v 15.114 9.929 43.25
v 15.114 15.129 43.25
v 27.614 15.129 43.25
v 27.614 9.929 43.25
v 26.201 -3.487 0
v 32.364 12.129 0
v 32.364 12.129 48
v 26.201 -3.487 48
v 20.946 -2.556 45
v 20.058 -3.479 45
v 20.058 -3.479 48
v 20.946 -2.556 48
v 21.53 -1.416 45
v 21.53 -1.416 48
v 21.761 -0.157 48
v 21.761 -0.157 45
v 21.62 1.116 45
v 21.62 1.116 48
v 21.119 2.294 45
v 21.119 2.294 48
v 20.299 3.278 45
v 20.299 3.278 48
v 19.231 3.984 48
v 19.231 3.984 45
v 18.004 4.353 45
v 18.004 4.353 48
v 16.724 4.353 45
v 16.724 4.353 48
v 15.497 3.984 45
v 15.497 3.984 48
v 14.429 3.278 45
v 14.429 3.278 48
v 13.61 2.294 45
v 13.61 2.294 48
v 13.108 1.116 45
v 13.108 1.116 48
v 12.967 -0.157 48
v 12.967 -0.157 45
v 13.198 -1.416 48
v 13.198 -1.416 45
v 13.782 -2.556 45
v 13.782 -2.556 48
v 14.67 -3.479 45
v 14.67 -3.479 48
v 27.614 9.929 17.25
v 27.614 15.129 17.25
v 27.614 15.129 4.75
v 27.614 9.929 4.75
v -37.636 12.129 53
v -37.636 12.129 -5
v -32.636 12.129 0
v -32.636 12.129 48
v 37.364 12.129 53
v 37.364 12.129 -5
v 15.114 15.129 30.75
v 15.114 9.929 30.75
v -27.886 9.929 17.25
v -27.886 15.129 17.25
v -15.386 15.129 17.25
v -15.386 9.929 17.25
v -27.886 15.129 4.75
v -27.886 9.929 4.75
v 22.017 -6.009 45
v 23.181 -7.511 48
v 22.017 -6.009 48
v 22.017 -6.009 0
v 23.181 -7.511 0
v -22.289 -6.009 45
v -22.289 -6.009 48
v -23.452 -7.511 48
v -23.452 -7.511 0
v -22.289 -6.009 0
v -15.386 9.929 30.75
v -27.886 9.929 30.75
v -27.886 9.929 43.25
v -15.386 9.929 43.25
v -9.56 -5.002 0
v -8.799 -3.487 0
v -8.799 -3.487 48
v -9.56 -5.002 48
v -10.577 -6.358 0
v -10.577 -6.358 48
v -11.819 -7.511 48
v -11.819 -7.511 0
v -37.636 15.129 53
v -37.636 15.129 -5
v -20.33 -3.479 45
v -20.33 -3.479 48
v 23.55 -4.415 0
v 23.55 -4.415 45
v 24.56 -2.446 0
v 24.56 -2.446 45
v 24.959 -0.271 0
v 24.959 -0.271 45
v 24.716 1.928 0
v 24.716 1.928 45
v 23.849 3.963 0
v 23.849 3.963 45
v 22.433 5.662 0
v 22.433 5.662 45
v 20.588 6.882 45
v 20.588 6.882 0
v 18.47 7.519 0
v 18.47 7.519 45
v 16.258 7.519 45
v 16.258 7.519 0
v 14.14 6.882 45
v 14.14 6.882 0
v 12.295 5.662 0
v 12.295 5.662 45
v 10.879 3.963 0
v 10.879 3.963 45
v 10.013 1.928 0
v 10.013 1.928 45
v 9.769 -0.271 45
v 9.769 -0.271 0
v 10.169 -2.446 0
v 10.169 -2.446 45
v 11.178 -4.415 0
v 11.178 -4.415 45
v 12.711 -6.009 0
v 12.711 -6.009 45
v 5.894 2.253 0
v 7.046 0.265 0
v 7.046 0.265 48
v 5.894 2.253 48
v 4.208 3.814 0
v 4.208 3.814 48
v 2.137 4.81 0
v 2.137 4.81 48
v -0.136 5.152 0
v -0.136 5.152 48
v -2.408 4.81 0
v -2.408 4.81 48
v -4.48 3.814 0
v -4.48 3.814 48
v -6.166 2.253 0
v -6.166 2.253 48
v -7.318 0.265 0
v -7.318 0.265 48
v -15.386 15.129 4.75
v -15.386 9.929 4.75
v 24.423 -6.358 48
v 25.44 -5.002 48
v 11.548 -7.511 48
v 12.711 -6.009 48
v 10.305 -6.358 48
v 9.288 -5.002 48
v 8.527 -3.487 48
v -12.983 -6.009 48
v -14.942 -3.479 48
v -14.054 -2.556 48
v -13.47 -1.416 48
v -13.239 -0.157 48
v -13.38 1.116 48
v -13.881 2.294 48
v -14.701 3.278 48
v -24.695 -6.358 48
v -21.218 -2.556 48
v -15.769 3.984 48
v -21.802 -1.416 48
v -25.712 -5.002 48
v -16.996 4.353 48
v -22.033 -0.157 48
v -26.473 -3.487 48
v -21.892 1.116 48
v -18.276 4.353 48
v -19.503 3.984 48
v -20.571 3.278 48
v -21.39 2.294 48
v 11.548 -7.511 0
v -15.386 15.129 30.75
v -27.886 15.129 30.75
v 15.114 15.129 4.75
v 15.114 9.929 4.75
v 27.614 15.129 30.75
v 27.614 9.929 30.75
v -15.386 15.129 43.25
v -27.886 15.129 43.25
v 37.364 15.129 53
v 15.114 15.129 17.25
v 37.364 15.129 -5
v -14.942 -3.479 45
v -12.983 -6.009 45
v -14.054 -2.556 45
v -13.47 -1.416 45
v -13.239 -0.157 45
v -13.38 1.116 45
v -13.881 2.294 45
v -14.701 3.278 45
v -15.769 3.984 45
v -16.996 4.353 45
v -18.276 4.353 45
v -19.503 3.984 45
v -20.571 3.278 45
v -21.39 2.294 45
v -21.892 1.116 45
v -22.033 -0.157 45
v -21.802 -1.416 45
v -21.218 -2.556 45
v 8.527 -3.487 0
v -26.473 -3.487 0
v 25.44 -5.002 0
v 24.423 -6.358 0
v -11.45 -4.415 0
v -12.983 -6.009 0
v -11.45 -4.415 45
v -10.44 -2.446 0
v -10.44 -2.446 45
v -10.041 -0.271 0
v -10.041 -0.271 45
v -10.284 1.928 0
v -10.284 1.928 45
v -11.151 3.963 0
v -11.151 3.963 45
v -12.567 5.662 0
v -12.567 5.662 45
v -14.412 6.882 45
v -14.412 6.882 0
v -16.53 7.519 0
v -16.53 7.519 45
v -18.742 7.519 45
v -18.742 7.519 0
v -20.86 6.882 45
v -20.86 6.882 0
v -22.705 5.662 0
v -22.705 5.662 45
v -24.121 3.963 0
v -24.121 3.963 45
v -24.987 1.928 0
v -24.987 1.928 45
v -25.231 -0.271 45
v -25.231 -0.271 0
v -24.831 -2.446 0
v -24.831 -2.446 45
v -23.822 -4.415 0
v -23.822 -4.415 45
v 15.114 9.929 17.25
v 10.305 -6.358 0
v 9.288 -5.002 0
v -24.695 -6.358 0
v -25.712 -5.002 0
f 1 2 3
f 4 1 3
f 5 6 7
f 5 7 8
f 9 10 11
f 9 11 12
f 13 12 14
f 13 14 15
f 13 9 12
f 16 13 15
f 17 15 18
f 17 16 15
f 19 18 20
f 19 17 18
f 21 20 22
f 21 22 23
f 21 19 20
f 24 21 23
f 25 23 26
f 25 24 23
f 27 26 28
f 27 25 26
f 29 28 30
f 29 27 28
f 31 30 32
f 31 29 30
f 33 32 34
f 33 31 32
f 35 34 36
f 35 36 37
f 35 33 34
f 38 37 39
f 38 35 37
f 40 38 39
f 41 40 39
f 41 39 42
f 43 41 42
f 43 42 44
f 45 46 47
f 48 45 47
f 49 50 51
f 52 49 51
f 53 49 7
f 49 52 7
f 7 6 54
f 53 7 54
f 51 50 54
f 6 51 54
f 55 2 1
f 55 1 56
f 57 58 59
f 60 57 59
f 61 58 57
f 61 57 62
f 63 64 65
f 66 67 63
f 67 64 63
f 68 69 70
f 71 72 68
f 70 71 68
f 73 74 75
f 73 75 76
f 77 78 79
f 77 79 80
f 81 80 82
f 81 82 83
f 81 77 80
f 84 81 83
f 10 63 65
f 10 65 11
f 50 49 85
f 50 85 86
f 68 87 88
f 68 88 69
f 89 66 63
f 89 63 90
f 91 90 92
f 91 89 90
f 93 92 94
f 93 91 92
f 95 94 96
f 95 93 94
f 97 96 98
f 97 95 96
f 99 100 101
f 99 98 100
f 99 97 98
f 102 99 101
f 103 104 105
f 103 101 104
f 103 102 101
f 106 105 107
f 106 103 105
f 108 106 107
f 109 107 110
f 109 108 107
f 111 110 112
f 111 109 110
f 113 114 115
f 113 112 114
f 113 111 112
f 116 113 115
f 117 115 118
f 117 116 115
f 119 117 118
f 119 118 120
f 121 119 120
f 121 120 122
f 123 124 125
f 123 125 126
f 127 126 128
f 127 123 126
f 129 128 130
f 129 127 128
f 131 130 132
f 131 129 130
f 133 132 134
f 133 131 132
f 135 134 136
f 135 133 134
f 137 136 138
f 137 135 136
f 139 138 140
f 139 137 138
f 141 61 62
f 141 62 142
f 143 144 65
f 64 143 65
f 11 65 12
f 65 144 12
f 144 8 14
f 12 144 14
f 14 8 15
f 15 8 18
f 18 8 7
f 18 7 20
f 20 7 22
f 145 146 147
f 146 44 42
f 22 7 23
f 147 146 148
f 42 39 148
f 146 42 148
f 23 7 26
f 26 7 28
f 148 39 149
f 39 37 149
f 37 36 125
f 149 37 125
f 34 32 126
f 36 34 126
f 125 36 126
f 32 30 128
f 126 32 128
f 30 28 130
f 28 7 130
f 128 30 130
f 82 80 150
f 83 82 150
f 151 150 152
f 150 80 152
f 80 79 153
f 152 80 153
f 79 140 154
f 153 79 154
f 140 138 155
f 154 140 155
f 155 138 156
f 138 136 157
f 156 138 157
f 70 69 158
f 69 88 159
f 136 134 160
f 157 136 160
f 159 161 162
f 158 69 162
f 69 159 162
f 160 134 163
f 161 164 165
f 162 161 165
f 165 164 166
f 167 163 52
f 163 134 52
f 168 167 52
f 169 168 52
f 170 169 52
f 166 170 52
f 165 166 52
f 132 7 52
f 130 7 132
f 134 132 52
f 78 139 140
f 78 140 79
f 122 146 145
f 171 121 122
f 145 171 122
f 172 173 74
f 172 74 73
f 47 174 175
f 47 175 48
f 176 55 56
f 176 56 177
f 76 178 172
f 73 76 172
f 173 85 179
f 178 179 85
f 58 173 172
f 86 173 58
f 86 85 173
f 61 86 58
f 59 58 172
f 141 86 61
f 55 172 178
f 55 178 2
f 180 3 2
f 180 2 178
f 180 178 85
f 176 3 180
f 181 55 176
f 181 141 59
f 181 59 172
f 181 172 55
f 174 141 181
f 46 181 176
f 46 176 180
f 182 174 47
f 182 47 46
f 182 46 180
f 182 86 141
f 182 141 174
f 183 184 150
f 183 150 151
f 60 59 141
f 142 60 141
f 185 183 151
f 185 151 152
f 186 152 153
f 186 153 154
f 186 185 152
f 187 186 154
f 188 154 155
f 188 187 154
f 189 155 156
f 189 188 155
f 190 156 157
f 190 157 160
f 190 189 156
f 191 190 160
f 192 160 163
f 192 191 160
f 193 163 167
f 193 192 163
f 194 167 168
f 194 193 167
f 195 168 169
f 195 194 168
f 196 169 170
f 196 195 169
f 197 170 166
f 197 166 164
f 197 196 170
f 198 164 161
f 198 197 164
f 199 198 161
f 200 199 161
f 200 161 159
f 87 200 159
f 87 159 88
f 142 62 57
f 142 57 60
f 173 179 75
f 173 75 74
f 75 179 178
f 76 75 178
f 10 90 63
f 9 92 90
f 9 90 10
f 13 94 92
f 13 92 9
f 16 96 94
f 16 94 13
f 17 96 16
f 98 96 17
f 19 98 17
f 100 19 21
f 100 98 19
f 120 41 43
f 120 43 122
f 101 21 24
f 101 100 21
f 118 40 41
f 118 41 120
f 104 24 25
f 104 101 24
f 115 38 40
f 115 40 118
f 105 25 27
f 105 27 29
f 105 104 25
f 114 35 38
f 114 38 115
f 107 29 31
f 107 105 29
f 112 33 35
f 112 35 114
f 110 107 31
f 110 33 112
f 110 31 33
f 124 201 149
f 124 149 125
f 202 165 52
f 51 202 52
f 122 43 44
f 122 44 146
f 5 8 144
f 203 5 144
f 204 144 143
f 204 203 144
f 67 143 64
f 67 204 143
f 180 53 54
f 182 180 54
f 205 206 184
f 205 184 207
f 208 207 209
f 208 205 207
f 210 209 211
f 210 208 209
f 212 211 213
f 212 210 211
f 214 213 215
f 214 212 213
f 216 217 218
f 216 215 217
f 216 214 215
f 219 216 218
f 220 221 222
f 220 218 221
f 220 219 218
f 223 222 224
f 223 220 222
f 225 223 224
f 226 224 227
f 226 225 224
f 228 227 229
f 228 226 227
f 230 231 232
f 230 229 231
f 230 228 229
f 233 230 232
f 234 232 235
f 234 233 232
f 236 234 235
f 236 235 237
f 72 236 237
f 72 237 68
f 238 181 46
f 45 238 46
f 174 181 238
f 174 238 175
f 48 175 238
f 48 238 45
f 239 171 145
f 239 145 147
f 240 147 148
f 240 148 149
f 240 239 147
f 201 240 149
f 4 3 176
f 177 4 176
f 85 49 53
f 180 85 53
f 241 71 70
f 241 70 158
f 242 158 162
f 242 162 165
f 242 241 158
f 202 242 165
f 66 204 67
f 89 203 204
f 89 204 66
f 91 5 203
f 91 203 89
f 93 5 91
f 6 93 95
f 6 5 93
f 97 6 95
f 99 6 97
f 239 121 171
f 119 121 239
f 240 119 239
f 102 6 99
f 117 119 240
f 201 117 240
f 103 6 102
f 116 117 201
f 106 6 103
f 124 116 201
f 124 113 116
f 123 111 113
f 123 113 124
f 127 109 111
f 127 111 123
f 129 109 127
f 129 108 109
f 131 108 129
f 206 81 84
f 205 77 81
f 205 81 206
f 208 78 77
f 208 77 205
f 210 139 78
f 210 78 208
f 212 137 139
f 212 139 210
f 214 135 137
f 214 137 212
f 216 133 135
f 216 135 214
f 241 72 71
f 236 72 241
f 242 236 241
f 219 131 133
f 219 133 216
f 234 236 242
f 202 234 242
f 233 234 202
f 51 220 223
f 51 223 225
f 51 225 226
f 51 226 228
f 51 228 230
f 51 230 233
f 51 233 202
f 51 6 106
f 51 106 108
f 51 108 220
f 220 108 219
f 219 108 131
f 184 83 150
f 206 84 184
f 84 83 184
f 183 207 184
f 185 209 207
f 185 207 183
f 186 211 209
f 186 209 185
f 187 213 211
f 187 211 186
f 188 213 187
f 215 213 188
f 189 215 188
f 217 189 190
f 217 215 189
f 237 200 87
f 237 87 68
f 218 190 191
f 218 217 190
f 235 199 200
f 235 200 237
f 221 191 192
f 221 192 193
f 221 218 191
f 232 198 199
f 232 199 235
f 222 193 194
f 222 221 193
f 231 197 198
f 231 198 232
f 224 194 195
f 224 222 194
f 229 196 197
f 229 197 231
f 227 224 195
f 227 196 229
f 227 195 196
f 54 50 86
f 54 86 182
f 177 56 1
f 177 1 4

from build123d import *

# Parameters (mm, degrees)
BOSS_EXTRUDE1_DEPTH = 48
BOSS_EXTRUDE2_START = -3
BOSS_EXTRUDE2_DEPTH = 3
SKETCH3_W           = 75
SKETCH3_H           = 58
BOSS_EXTRUDE3_DEPTH = 3
SKETCH4_W           = 12.5
SKETCH4_H           = 12.5
CUT_EXTRUDE1_DEPTH  = 5.2


with BuildPart() as part:
    # Sketch1 → Boss-Extrude1 (new body)
    with BuildSketch(Plane.XY):
        with BuildLine():
            Line((-32.6359499, 12.129277561), (32.3640501, 12.129277561))
            Line((32.3640501, 12.129277561), (26.200760796, -3.487483918))
            ThreePointArc((26.200760796, -3.487483918), (24.961869302, -5.702906573), (23.180569313, -7.51119859))
            Line((23.180569313, -7.51119859), (22.01726547, -6.008958872))
            ThreePointArc((22.01726547, -6.008958872), (17.3640501, 7.6), (12.710834731, -6.008958872))
            Line((12.710834731, -6.008958872), (11.547530888, -7.51119859))
            ThreePointArc((11.547530888, -7.51119859), (9.766230899, -5.702906573), (8.527339405, -3.487483918))
            Line((8.527339405, -3.487483918), (7.046449616, 0.264847258))
            ThreePointArc((7.046449616, 0.264847258), (-0.1359499, 5.15176662), (-7.318349416, 0.264847258))
            Line((-7.318349416, 0.264847258), (-8.799239204, -3.487483918))
            ThreePointArc((-8.799239204, -3.487483918), (-10.038130698, -5.702906573), (-11.819430687, -7.51119859))
            Line((-11.819430687, -7.51119859), (-12.98273453, -6.008958872))
            ThreePointArc((-12.98273453, -6.008958872), (-17.6359499, 7.6), (-22.289165269, -6.008958872))
            Line((-22.289165269, -6.008958872), (-23.452469112, -7.51119859))
            ThreePointArc((-23.452469112, -7.51119859), (-25.233769101, -5.702906573), (-26.472660595, -3.487483918))
            Line((-26.472660595, -3.487483918), (-32.6359499, 12.129277561))
        make_face()
    extrude(amount=BOSS_EXTRUDE1_DEPTH)

    # Sketch2 → Boss-Extrude2 (add)
    with BuildSketch(Plane.XY.offset(48).offset(BOSS_EXTRUDE2_START)):
        with BuildLine():
            Line((22.01726547, -6.008958872), (20.058016894, -3.478870926))
            ThreePointArc((20.058016894, -3.478870926), (17.3640501, 4.4), (14.670083307, -3.478870926))
            Line((14.670083307, -3.478870926), (12.710834731, -6.008958872))
            ThreePointArc((12.710834731, -6.008958872), (17.3640501, 7.6), (22.01726547, -6.008958872))
        make_face()
        with BuildLine():
            Line((-12.98273453, -6.008958872), (-14.941983106, -3.478870926))
            ThreePointArc((-14.941983106, -3.478870926), (-17.6359499, 4.4), (-20.329916693, -3.478870926))
            Line((-20.329916693, -3.478870926), (-22.289165269, -6.008958872))
            ThreePointArc((-22.289165269, -6.008958872), (-17.6359499, 7.6), (-12.98273453, -6.008958872))
        make_face()
    extrude(amount=BOSS_EXTRUDE2_DEPTH)

    # Sketch3 → Boss-Extrude3 (add)
    with BuildSketch(Plane(origin=(0, 12.129277561, 0), x_dir=(1, 0, 0), z_dir=(0, 1, 0))):
        with Locations((-0.1359499, -24)):
            Rectangle(SKETCH3_W, SKETCH3_H)
    extrude(amount=BOSS_EXTRUDE3_DEPTH)

    # Sketch4 → Cut-Extrude1 (cut)
    with BuildSketch(Plane(origin=(0, 15.129277561, 0), x_dir=(1, 0, 0), z_dir=(0, 1, 0))):
        with Locations((21.3640501, -11)):
            Rectangle(SKETCH4_W, SKETCH4_H)
        with Locations((21.3640501, -37)):
            Rectangle(SKETCH4_W, SKETCH4_H)
        with Locations((-21.6359499, -37)):
            Rectangle(SKETCH4_W, SKETCH4_H)
        with Locations((-21.6359499, -11)):
            Rectangle(SKETCH4_W, SKETCH4_H)
    extrude(amount=-CUT_EXTRUDE1_DEPTH, mode=Mode.SUBTRACT)


solid = part.part
